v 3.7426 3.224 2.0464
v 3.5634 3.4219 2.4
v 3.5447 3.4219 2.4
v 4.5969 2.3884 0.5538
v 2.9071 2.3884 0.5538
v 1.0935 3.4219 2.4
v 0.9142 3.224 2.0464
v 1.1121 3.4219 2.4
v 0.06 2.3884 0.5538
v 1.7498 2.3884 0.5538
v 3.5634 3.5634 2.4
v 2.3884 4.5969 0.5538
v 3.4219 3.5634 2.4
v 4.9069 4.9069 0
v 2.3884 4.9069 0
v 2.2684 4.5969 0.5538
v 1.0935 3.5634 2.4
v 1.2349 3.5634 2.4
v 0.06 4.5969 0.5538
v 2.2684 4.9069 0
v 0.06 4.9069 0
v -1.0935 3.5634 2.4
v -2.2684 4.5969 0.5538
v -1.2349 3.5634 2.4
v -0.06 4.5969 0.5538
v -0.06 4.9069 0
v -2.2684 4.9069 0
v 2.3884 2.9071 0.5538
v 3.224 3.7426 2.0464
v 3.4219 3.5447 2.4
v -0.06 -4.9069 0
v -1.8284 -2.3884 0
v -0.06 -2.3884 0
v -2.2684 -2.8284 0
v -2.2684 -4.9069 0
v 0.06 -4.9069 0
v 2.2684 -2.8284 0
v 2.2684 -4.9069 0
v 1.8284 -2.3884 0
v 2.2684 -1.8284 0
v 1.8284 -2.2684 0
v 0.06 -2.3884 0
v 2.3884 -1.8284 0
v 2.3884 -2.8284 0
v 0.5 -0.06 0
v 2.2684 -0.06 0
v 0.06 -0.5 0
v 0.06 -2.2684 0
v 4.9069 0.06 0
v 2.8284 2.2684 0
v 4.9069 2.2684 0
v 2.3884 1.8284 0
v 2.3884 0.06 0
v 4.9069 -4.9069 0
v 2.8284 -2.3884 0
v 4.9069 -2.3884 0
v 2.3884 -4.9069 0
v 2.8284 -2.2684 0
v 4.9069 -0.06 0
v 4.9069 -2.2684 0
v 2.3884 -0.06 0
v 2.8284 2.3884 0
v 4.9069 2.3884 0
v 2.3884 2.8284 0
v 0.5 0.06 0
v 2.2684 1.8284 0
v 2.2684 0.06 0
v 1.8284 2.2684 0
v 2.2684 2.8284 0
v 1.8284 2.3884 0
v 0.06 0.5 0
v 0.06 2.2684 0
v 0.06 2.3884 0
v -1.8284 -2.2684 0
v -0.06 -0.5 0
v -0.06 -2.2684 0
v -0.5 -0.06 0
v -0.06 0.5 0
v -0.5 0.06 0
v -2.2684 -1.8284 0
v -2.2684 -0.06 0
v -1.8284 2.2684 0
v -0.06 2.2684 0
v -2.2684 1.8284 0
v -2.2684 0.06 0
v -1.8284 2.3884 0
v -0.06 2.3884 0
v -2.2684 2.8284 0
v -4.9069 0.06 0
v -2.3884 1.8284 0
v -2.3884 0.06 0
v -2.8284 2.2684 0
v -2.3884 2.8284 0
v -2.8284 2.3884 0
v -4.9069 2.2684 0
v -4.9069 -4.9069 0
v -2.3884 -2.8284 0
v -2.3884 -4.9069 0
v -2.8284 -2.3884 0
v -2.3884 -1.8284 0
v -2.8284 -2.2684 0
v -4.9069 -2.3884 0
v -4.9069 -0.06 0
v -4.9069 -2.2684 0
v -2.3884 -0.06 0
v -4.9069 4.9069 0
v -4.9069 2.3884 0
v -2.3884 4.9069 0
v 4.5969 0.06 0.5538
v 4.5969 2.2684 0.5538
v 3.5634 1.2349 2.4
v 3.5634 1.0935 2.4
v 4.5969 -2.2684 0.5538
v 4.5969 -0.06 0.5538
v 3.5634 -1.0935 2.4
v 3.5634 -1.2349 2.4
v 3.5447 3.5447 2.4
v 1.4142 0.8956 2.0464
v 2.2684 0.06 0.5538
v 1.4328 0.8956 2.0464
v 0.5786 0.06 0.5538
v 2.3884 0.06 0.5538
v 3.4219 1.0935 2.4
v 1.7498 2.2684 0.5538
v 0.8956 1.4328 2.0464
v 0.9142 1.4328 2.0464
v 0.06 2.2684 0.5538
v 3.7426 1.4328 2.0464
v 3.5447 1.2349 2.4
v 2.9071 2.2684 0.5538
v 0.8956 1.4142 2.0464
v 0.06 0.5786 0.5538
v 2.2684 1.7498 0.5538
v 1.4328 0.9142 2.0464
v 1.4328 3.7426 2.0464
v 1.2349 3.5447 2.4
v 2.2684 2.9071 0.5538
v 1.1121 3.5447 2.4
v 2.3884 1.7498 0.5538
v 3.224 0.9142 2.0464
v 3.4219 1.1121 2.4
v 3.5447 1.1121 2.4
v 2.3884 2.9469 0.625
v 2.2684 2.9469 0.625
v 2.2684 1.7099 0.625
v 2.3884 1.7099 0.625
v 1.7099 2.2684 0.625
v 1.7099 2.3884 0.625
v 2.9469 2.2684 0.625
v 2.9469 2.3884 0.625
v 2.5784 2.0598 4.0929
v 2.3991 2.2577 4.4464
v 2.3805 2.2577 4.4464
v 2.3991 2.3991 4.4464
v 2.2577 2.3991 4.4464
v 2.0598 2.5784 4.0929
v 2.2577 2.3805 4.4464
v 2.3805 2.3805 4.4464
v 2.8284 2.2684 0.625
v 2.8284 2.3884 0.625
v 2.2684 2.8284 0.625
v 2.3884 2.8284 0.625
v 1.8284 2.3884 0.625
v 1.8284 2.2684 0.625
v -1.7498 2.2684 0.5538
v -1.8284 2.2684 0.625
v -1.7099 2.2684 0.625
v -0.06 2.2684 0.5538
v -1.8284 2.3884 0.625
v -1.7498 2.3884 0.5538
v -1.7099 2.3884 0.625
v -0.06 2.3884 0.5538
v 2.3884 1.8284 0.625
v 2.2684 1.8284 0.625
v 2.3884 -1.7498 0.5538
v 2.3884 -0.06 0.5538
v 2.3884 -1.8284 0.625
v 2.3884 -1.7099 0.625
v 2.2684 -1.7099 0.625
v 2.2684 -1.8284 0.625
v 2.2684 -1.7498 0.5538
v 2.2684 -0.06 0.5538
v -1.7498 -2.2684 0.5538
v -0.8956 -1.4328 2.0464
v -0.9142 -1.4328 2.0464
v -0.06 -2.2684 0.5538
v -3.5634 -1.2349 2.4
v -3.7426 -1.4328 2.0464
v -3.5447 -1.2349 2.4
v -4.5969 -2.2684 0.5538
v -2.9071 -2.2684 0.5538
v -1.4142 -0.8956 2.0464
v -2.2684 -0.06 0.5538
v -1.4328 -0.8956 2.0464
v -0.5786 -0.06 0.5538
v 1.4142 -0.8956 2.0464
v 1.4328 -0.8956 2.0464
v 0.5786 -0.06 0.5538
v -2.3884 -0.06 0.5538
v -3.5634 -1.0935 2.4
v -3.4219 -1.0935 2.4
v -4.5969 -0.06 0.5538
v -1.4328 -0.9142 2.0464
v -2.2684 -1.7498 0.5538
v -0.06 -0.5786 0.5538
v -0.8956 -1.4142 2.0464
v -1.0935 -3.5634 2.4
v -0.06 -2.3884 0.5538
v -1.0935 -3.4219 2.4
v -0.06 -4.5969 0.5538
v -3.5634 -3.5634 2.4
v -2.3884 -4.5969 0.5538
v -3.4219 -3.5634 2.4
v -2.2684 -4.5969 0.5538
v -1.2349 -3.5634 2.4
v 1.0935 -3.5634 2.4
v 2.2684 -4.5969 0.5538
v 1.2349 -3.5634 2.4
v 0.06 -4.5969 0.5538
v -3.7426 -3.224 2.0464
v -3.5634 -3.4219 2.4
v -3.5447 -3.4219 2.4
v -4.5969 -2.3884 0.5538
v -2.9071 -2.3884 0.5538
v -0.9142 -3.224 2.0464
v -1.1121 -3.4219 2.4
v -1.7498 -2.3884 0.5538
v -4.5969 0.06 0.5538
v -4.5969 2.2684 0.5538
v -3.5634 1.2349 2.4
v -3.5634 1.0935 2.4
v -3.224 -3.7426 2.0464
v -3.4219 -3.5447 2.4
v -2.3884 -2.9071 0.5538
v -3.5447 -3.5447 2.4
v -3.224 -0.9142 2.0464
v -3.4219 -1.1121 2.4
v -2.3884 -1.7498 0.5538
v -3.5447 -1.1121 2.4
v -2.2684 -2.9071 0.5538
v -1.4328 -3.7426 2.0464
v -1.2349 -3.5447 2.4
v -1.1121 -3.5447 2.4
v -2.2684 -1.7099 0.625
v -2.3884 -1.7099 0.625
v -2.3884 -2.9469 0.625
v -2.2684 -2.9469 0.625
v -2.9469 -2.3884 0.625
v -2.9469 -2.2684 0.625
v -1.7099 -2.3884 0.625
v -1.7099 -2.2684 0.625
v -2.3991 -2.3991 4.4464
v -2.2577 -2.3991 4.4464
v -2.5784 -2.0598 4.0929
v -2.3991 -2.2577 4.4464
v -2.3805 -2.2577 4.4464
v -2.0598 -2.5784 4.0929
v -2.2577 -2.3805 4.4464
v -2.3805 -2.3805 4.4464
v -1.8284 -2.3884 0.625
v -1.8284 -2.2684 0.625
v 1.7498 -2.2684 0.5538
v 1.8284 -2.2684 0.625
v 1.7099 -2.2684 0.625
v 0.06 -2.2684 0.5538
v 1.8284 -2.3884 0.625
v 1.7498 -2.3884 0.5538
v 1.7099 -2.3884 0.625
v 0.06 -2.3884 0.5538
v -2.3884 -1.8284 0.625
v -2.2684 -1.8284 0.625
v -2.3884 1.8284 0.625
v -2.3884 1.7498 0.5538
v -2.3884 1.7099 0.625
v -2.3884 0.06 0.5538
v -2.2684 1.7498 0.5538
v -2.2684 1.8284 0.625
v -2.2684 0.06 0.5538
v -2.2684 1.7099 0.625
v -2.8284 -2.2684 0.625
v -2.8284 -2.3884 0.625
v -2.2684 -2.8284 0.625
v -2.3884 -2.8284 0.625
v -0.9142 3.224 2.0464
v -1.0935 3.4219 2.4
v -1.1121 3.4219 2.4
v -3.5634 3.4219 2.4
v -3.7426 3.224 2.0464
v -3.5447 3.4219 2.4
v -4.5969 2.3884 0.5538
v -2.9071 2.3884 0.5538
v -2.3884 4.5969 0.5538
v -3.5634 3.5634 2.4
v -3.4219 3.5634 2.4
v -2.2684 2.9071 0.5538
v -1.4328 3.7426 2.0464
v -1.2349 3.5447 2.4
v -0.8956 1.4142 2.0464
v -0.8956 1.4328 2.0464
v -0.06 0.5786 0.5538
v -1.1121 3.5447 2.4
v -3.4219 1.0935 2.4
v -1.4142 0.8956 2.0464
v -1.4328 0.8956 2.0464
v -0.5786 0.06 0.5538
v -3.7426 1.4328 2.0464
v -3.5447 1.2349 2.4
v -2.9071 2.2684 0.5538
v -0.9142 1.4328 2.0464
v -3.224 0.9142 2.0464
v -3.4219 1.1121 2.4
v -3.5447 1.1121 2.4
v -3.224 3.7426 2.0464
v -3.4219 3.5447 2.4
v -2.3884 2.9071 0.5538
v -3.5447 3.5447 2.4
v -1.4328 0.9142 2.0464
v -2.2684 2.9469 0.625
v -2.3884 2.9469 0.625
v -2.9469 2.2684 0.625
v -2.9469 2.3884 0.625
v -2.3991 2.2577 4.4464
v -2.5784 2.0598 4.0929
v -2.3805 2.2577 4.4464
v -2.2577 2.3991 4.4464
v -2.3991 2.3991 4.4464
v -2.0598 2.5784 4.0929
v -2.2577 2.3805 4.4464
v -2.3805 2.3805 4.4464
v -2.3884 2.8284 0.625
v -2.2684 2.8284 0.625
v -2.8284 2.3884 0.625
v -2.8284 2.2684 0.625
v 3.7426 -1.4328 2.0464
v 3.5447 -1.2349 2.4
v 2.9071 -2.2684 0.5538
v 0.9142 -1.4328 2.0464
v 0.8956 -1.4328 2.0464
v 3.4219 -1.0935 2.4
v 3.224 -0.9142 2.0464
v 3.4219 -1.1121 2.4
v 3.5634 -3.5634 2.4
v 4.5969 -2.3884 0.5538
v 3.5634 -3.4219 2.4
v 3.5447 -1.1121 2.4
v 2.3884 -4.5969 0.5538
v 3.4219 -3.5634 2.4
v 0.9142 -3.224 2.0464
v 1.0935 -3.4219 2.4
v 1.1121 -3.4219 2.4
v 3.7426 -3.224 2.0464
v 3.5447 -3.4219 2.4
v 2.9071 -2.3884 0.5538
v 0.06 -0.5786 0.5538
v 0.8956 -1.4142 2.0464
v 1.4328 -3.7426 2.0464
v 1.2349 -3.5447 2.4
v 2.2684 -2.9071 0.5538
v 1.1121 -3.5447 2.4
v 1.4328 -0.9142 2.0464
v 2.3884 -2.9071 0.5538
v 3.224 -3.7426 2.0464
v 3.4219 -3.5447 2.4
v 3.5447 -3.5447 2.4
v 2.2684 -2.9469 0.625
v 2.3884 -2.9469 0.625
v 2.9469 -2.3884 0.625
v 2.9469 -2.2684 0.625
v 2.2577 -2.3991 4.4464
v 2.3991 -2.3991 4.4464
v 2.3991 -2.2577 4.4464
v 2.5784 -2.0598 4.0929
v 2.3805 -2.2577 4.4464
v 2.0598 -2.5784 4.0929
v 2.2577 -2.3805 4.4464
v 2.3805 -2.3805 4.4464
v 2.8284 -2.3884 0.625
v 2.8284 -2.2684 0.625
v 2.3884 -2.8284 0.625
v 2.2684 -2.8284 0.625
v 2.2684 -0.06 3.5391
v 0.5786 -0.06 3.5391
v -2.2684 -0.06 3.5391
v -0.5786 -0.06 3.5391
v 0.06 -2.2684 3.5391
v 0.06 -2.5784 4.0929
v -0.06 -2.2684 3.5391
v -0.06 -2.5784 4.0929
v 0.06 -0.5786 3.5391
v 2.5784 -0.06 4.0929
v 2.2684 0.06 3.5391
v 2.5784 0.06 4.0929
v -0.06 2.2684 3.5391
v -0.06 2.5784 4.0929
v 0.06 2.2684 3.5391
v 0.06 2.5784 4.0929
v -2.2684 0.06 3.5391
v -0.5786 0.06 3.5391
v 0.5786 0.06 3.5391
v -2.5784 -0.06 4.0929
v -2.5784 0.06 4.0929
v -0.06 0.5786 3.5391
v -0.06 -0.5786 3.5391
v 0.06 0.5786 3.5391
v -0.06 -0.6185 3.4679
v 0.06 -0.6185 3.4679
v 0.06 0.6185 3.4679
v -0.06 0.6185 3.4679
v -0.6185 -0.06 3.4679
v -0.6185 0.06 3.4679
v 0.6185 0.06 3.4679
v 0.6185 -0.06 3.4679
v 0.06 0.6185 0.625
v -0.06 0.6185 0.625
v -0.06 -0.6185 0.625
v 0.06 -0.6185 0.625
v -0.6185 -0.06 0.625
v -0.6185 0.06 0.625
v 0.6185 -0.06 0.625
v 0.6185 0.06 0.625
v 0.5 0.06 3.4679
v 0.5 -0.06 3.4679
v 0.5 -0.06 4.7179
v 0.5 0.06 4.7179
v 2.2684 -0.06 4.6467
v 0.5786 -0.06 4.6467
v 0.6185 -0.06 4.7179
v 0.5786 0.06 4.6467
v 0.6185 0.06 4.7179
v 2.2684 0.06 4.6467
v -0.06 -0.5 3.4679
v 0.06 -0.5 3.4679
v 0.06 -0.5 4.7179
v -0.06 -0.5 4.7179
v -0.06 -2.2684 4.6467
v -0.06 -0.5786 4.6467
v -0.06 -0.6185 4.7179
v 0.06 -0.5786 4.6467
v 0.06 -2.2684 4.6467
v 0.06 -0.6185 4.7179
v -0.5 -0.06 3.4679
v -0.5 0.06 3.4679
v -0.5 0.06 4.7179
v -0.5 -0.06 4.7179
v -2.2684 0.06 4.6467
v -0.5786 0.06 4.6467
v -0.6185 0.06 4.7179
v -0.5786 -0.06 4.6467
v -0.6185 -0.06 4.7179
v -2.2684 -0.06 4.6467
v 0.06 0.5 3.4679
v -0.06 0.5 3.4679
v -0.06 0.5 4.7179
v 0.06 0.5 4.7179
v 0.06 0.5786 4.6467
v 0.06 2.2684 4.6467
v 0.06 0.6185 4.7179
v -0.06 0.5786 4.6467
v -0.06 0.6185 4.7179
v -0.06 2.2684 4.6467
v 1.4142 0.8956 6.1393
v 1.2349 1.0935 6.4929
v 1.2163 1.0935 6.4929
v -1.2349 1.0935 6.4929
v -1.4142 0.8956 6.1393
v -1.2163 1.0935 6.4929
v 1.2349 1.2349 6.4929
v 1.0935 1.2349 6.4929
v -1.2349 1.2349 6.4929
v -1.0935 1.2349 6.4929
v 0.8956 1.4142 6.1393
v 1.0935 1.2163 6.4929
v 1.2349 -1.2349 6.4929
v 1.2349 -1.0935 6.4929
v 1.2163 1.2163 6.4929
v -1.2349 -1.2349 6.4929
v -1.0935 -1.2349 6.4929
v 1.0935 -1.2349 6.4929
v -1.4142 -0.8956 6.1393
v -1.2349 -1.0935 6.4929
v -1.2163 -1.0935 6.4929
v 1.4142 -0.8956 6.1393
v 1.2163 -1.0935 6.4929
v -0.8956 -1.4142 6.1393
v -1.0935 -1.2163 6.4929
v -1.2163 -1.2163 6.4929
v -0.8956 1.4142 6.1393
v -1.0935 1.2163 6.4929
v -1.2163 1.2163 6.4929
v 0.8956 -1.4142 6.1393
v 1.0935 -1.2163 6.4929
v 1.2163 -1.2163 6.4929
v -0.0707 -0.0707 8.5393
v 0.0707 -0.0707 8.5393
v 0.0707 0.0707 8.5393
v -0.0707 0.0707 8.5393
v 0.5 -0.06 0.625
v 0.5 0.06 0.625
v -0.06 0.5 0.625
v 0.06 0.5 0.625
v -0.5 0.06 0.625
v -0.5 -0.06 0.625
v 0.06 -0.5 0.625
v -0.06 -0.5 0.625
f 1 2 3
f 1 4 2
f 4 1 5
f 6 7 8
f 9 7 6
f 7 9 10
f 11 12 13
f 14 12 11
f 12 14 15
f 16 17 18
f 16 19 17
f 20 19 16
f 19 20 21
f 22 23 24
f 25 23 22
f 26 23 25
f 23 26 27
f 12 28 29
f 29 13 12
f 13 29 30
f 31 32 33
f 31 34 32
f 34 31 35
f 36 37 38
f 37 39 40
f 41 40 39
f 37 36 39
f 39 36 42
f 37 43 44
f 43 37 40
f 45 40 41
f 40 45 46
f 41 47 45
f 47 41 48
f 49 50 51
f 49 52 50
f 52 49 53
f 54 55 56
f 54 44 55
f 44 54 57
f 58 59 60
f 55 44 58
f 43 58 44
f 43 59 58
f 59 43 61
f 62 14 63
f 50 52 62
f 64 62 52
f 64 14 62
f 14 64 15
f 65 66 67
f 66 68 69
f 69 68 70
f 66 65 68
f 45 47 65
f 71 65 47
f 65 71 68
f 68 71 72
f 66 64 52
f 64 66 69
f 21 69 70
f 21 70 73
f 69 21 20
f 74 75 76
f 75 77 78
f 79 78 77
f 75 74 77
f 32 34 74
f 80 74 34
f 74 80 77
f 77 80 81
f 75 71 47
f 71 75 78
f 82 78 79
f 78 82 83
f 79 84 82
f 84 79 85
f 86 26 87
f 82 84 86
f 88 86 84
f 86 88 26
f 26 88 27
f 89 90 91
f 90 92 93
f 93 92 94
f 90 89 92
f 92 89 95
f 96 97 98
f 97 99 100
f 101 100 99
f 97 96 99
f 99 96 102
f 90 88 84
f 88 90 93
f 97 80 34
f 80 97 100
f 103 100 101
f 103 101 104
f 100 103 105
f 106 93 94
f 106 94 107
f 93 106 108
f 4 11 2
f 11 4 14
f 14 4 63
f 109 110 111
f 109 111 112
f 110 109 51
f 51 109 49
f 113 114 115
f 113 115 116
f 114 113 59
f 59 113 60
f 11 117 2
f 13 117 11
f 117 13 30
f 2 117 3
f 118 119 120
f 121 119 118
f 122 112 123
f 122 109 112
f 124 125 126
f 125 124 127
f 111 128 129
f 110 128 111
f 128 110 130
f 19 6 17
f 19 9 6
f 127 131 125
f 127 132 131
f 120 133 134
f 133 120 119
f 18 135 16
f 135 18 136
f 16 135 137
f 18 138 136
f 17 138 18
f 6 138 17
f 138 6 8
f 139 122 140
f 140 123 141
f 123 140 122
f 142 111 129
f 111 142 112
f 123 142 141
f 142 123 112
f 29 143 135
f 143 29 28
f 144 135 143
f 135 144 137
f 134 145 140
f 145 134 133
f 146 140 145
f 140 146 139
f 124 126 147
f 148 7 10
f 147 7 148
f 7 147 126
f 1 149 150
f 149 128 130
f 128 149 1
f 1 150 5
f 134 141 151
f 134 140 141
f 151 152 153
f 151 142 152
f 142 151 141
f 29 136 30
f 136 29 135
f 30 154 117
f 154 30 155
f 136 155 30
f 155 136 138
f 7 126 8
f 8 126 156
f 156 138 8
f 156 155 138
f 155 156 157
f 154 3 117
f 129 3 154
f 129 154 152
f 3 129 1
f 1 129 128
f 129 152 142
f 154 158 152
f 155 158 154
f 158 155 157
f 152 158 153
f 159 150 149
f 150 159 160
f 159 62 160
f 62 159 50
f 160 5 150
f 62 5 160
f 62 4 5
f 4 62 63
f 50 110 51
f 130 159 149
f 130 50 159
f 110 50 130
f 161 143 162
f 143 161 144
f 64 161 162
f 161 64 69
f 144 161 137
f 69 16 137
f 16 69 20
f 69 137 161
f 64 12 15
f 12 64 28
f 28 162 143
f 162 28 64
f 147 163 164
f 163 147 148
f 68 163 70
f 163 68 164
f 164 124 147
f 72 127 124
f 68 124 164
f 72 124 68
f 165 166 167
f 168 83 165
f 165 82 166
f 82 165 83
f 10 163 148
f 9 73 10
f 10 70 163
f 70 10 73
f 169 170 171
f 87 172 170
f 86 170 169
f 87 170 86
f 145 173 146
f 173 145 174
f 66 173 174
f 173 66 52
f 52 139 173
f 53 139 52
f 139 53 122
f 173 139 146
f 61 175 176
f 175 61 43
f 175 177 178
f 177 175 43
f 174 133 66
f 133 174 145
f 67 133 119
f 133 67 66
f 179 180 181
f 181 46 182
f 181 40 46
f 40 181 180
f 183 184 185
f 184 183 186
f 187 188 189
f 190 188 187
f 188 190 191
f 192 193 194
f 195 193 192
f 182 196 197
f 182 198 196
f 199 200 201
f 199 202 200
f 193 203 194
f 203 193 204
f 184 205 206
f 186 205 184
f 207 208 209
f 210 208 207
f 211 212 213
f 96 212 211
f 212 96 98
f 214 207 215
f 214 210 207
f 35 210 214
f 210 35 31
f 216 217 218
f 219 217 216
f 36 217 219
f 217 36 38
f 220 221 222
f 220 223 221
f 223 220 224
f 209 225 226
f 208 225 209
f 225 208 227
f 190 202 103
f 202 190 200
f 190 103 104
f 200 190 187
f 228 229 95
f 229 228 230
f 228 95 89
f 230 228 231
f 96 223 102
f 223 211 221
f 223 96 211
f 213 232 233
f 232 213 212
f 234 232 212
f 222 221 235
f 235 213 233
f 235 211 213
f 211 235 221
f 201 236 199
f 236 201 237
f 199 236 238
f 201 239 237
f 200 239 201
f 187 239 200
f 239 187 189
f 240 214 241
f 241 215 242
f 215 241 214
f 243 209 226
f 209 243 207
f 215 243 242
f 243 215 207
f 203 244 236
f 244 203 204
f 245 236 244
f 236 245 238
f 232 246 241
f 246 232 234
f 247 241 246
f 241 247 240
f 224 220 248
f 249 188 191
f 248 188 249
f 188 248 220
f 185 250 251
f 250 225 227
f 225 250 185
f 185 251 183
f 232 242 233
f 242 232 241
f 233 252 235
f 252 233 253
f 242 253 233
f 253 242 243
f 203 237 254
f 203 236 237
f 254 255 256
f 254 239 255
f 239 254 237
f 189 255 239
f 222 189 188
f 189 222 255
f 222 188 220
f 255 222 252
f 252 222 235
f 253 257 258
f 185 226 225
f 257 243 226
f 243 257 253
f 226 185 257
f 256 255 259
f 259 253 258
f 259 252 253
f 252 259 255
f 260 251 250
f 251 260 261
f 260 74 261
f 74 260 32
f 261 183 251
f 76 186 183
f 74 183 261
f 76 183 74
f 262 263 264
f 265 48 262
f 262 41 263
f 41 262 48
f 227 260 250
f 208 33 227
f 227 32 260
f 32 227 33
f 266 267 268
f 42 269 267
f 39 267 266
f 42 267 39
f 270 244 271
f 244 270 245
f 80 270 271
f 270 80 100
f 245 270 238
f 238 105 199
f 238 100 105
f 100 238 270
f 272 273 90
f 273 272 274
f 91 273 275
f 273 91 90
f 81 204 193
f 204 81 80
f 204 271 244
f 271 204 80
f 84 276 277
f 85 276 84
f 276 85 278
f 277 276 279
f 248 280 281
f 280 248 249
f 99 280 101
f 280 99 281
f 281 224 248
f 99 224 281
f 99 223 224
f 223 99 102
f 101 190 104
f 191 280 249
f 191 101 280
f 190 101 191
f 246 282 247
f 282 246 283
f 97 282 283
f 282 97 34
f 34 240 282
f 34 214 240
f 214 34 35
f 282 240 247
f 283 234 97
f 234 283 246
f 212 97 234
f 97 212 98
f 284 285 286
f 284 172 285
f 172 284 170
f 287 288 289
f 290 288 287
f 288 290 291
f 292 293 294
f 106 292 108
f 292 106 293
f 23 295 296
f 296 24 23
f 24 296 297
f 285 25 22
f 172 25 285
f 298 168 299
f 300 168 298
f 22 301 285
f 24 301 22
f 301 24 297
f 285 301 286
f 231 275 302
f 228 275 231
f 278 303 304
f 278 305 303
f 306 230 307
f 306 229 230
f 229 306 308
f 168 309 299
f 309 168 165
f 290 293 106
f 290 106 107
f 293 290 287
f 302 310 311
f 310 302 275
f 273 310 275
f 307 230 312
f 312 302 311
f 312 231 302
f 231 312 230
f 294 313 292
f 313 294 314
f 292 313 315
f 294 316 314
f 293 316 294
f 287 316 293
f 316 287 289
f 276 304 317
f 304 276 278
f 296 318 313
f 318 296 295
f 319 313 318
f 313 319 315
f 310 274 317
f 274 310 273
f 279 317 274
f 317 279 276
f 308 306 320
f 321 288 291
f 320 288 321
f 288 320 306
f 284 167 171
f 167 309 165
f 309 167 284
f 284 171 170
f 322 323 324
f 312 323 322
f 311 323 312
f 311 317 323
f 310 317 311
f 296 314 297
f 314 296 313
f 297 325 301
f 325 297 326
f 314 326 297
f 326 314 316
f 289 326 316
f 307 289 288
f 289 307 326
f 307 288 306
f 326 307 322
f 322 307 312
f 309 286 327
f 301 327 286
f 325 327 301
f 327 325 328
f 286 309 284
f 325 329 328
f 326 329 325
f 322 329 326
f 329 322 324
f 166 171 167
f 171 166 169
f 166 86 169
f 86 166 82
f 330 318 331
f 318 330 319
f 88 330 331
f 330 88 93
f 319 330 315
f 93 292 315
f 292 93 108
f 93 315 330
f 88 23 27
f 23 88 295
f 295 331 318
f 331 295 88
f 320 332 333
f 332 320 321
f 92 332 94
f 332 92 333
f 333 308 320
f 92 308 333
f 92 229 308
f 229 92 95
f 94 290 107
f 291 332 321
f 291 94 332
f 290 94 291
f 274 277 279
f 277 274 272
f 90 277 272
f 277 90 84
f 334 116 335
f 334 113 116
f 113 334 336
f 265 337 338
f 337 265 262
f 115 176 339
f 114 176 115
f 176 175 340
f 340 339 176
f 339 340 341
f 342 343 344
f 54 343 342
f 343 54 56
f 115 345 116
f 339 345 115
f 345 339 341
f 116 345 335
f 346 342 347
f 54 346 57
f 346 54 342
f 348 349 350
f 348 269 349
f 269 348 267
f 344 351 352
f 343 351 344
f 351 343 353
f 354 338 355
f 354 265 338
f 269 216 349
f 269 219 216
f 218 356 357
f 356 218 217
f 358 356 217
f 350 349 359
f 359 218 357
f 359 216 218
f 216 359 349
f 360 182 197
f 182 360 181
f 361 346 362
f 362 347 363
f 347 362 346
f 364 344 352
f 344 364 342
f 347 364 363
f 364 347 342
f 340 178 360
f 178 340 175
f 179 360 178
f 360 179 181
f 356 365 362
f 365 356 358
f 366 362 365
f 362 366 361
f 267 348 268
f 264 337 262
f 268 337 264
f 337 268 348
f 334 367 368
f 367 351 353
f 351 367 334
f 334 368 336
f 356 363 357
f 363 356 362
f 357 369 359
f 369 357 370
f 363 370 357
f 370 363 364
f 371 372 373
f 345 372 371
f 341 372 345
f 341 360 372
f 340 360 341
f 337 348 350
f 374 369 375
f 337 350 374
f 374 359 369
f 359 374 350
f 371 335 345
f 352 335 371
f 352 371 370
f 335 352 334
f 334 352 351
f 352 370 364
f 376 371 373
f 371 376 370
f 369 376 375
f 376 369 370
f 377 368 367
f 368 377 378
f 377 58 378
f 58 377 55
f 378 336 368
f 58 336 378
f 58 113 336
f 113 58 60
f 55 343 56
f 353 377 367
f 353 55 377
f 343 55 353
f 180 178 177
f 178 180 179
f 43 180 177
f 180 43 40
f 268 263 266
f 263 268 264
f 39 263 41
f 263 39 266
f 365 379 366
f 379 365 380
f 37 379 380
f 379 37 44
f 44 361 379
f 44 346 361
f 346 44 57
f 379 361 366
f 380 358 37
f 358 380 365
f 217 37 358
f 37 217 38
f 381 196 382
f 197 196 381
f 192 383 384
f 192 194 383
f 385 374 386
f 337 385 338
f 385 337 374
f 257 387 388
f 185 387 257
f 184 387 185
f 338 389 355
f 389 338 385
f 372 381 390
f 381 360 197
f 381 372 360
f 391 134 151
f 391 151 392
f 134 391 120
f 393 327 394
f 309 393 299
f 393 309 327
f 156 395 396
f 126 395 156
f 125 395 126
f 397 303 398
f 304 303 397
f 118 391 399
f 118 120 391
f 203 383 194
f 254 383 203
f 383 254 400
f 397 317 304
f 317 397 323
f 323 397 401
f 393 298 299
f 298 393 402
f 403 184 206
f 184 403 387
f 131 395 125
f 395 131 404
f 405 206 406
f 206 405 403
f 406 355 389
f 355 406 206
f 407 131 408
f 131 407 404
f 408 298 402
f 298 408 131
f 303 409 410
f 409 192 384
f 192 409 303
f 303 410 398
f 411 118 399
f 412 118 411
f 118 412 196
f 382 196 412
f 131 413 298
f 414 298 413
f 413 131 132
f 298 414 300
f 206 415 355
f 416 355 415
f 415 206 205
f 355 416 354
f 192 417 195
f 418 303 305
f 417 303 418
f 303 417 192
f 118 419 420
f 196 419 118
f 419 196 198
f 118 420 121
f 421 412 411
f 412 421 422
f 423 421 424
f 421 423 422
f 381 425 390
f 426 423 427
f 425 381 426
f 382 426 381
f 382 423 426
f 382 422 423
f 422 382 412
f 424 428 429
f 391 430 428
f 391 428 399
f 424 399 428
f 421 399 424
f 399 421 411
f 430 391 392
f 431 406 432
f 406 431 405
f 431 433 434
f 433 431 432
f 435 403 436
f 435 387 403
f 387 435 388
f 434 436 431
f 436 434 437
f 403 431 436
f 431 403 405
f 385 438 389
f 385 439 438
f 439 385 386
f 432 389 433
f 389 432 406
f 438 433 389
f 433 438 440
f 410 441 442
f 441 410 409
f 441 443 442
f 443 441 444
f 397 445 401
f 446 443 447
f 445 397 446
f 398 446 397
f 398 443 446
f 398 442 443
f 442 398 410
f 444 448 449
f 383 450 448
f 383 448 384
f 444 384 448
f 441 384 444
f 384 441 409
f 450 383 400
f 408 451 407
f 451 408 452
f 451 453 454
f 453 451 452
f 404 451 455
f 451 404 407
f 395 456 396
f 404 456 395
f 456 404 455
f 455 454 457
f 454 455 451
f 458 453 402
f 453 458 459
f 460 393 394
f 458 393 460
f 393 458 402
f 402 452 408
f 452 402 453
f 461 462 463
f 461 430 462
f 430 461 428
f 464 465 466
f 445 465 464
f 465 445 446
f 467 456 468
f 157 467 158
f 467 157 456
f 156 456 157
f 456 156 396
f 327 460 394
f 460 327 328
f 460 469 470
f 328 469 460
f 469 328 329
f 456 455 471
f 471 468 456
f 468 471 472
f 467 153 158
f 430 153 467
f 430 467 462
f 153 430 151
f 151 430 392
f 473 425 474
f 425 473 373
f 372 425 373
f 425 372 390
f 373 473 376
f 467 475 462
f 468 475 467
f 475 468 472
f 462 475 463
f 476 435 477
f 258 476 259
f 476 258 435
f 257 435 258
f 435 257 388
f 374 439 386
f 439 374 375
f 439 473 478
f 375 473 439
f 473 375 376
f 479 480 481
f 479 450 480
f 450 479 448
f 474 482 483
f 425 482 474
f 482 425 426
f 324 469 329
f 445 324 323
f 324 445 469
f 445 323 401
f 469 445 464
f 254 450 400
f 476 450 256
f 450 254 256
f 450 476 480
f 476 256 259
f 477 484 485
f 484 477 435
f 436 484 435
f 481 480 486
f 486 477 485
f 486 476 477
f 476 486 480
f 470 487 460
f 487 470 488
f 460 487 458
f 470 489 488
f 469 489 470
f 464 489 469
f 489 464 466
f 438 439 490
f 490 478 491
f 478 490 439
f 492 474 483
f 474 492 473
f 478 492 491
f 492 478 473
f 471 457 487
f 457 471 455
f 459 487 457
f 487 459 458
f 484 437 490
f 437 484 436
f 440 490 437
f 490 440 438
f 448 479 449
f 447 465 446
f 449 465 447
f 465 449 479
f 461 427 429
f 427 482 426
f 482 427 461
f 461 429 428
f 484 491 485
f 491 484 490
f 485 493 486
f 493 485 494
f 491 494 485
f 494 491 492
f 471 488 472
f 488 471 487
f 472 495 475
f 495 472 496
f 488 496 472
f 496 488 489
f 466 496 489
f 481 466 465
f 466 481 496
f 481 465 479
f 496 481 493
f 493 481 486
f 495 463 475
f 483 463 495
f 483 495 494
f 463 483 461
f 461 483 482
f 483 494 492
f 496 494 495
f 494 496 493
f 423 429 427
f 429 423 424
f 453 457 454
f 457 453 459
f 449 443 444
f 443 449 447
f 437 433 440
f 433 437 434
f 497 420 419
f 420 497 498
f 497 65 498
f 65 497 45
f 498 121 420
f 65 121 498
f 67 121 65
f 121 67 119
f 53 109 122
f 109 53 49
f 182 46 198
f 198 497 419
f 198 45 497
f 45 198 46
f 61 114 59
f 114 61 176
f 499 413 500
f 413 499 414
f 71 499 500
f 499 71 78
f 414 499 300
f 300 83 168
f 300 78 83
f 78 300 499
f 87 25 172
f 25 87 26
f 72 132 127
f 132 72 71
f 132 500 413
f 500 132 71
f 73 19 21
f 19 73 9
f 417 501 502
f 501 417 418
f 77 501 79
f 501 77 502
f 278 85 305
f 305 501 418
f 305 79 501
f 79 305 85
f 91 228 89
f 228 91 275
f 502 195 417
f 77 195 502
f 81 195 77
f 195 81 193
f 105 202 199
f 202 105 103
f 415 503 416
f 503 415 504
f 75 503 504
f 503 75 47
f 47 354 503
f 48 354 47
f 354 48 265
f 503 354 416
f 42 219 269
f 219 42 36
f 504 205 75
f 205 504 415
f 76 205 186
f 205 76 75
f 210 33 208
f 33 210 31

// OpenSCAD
// copyright aeropic 2017

// order of sierpinski fractal
order = 2; //[0,1,2,3,4,5,6,7]
// size of smallest pyramid
size = 2.0; //[2:50]

/* [Hidden] */
eps  = 0.25;
epsy = 0.12;
epsr = 0.1;
epsh = 2.5*eps;
sq2  = 1.41421356;
epsl = 0.5;

difference() {
  ss(order-1);
  translate([-120, -120, -3]) cube([240, 240, 3]);
}

module ss(ord){
  k = pow(2, ord);
  w = size*k;
  if (k<1) rotate(45) cylinder(r1=size, r2=epsr, h=1.2*size, $fn=4);
  else difference() {
    union () {
      // draw the six sub-pyramids overlapped a bit for printing in spiral vase mode
      translate([-k*eps+w/sq2, -k*eps+w/sq2, 0]) ss(ord-1);
      translate([+k*eps-w/sq2, +k*eps-w/sq2, 0]) ss(ord-1);
      translate([+k*eps-w/sq2, -k*eps+w/sq2, 0]) ss(ord-1);
      translate([-k*eps+w/sq2, +k*eps-w/sq2, 0]) ss(ord-1);
      translate([0, 0, -sq2*k*eps+1.2*w]) rotate([180,0,0]) ss(ord-1);
      translate([0, 0, -sq2*k*eps+1.2*w]) rotate([  0,0,0]) ss(ord-1);
      cube([0.3, 0.3, 2], center=true);
    }
    // seperate pyramid bases
    #rotate(  0) translate([epsl, -epsy/2, 0]) cube([sq2*w, epsy, epsh]);
    #rotate( 90) translate([epsl, -epsy/2, 0]) cube([sq2*w, epsy, epsh]);
    #rotate(180) translate([epsl, -epsy/2, 0]) cube([sq2*w, epsy, epsh]);
    #rotate(270) translate([epsl, -epsy/2, 0]) cube([sq2*w, epsy, epsh]);
  }
}
